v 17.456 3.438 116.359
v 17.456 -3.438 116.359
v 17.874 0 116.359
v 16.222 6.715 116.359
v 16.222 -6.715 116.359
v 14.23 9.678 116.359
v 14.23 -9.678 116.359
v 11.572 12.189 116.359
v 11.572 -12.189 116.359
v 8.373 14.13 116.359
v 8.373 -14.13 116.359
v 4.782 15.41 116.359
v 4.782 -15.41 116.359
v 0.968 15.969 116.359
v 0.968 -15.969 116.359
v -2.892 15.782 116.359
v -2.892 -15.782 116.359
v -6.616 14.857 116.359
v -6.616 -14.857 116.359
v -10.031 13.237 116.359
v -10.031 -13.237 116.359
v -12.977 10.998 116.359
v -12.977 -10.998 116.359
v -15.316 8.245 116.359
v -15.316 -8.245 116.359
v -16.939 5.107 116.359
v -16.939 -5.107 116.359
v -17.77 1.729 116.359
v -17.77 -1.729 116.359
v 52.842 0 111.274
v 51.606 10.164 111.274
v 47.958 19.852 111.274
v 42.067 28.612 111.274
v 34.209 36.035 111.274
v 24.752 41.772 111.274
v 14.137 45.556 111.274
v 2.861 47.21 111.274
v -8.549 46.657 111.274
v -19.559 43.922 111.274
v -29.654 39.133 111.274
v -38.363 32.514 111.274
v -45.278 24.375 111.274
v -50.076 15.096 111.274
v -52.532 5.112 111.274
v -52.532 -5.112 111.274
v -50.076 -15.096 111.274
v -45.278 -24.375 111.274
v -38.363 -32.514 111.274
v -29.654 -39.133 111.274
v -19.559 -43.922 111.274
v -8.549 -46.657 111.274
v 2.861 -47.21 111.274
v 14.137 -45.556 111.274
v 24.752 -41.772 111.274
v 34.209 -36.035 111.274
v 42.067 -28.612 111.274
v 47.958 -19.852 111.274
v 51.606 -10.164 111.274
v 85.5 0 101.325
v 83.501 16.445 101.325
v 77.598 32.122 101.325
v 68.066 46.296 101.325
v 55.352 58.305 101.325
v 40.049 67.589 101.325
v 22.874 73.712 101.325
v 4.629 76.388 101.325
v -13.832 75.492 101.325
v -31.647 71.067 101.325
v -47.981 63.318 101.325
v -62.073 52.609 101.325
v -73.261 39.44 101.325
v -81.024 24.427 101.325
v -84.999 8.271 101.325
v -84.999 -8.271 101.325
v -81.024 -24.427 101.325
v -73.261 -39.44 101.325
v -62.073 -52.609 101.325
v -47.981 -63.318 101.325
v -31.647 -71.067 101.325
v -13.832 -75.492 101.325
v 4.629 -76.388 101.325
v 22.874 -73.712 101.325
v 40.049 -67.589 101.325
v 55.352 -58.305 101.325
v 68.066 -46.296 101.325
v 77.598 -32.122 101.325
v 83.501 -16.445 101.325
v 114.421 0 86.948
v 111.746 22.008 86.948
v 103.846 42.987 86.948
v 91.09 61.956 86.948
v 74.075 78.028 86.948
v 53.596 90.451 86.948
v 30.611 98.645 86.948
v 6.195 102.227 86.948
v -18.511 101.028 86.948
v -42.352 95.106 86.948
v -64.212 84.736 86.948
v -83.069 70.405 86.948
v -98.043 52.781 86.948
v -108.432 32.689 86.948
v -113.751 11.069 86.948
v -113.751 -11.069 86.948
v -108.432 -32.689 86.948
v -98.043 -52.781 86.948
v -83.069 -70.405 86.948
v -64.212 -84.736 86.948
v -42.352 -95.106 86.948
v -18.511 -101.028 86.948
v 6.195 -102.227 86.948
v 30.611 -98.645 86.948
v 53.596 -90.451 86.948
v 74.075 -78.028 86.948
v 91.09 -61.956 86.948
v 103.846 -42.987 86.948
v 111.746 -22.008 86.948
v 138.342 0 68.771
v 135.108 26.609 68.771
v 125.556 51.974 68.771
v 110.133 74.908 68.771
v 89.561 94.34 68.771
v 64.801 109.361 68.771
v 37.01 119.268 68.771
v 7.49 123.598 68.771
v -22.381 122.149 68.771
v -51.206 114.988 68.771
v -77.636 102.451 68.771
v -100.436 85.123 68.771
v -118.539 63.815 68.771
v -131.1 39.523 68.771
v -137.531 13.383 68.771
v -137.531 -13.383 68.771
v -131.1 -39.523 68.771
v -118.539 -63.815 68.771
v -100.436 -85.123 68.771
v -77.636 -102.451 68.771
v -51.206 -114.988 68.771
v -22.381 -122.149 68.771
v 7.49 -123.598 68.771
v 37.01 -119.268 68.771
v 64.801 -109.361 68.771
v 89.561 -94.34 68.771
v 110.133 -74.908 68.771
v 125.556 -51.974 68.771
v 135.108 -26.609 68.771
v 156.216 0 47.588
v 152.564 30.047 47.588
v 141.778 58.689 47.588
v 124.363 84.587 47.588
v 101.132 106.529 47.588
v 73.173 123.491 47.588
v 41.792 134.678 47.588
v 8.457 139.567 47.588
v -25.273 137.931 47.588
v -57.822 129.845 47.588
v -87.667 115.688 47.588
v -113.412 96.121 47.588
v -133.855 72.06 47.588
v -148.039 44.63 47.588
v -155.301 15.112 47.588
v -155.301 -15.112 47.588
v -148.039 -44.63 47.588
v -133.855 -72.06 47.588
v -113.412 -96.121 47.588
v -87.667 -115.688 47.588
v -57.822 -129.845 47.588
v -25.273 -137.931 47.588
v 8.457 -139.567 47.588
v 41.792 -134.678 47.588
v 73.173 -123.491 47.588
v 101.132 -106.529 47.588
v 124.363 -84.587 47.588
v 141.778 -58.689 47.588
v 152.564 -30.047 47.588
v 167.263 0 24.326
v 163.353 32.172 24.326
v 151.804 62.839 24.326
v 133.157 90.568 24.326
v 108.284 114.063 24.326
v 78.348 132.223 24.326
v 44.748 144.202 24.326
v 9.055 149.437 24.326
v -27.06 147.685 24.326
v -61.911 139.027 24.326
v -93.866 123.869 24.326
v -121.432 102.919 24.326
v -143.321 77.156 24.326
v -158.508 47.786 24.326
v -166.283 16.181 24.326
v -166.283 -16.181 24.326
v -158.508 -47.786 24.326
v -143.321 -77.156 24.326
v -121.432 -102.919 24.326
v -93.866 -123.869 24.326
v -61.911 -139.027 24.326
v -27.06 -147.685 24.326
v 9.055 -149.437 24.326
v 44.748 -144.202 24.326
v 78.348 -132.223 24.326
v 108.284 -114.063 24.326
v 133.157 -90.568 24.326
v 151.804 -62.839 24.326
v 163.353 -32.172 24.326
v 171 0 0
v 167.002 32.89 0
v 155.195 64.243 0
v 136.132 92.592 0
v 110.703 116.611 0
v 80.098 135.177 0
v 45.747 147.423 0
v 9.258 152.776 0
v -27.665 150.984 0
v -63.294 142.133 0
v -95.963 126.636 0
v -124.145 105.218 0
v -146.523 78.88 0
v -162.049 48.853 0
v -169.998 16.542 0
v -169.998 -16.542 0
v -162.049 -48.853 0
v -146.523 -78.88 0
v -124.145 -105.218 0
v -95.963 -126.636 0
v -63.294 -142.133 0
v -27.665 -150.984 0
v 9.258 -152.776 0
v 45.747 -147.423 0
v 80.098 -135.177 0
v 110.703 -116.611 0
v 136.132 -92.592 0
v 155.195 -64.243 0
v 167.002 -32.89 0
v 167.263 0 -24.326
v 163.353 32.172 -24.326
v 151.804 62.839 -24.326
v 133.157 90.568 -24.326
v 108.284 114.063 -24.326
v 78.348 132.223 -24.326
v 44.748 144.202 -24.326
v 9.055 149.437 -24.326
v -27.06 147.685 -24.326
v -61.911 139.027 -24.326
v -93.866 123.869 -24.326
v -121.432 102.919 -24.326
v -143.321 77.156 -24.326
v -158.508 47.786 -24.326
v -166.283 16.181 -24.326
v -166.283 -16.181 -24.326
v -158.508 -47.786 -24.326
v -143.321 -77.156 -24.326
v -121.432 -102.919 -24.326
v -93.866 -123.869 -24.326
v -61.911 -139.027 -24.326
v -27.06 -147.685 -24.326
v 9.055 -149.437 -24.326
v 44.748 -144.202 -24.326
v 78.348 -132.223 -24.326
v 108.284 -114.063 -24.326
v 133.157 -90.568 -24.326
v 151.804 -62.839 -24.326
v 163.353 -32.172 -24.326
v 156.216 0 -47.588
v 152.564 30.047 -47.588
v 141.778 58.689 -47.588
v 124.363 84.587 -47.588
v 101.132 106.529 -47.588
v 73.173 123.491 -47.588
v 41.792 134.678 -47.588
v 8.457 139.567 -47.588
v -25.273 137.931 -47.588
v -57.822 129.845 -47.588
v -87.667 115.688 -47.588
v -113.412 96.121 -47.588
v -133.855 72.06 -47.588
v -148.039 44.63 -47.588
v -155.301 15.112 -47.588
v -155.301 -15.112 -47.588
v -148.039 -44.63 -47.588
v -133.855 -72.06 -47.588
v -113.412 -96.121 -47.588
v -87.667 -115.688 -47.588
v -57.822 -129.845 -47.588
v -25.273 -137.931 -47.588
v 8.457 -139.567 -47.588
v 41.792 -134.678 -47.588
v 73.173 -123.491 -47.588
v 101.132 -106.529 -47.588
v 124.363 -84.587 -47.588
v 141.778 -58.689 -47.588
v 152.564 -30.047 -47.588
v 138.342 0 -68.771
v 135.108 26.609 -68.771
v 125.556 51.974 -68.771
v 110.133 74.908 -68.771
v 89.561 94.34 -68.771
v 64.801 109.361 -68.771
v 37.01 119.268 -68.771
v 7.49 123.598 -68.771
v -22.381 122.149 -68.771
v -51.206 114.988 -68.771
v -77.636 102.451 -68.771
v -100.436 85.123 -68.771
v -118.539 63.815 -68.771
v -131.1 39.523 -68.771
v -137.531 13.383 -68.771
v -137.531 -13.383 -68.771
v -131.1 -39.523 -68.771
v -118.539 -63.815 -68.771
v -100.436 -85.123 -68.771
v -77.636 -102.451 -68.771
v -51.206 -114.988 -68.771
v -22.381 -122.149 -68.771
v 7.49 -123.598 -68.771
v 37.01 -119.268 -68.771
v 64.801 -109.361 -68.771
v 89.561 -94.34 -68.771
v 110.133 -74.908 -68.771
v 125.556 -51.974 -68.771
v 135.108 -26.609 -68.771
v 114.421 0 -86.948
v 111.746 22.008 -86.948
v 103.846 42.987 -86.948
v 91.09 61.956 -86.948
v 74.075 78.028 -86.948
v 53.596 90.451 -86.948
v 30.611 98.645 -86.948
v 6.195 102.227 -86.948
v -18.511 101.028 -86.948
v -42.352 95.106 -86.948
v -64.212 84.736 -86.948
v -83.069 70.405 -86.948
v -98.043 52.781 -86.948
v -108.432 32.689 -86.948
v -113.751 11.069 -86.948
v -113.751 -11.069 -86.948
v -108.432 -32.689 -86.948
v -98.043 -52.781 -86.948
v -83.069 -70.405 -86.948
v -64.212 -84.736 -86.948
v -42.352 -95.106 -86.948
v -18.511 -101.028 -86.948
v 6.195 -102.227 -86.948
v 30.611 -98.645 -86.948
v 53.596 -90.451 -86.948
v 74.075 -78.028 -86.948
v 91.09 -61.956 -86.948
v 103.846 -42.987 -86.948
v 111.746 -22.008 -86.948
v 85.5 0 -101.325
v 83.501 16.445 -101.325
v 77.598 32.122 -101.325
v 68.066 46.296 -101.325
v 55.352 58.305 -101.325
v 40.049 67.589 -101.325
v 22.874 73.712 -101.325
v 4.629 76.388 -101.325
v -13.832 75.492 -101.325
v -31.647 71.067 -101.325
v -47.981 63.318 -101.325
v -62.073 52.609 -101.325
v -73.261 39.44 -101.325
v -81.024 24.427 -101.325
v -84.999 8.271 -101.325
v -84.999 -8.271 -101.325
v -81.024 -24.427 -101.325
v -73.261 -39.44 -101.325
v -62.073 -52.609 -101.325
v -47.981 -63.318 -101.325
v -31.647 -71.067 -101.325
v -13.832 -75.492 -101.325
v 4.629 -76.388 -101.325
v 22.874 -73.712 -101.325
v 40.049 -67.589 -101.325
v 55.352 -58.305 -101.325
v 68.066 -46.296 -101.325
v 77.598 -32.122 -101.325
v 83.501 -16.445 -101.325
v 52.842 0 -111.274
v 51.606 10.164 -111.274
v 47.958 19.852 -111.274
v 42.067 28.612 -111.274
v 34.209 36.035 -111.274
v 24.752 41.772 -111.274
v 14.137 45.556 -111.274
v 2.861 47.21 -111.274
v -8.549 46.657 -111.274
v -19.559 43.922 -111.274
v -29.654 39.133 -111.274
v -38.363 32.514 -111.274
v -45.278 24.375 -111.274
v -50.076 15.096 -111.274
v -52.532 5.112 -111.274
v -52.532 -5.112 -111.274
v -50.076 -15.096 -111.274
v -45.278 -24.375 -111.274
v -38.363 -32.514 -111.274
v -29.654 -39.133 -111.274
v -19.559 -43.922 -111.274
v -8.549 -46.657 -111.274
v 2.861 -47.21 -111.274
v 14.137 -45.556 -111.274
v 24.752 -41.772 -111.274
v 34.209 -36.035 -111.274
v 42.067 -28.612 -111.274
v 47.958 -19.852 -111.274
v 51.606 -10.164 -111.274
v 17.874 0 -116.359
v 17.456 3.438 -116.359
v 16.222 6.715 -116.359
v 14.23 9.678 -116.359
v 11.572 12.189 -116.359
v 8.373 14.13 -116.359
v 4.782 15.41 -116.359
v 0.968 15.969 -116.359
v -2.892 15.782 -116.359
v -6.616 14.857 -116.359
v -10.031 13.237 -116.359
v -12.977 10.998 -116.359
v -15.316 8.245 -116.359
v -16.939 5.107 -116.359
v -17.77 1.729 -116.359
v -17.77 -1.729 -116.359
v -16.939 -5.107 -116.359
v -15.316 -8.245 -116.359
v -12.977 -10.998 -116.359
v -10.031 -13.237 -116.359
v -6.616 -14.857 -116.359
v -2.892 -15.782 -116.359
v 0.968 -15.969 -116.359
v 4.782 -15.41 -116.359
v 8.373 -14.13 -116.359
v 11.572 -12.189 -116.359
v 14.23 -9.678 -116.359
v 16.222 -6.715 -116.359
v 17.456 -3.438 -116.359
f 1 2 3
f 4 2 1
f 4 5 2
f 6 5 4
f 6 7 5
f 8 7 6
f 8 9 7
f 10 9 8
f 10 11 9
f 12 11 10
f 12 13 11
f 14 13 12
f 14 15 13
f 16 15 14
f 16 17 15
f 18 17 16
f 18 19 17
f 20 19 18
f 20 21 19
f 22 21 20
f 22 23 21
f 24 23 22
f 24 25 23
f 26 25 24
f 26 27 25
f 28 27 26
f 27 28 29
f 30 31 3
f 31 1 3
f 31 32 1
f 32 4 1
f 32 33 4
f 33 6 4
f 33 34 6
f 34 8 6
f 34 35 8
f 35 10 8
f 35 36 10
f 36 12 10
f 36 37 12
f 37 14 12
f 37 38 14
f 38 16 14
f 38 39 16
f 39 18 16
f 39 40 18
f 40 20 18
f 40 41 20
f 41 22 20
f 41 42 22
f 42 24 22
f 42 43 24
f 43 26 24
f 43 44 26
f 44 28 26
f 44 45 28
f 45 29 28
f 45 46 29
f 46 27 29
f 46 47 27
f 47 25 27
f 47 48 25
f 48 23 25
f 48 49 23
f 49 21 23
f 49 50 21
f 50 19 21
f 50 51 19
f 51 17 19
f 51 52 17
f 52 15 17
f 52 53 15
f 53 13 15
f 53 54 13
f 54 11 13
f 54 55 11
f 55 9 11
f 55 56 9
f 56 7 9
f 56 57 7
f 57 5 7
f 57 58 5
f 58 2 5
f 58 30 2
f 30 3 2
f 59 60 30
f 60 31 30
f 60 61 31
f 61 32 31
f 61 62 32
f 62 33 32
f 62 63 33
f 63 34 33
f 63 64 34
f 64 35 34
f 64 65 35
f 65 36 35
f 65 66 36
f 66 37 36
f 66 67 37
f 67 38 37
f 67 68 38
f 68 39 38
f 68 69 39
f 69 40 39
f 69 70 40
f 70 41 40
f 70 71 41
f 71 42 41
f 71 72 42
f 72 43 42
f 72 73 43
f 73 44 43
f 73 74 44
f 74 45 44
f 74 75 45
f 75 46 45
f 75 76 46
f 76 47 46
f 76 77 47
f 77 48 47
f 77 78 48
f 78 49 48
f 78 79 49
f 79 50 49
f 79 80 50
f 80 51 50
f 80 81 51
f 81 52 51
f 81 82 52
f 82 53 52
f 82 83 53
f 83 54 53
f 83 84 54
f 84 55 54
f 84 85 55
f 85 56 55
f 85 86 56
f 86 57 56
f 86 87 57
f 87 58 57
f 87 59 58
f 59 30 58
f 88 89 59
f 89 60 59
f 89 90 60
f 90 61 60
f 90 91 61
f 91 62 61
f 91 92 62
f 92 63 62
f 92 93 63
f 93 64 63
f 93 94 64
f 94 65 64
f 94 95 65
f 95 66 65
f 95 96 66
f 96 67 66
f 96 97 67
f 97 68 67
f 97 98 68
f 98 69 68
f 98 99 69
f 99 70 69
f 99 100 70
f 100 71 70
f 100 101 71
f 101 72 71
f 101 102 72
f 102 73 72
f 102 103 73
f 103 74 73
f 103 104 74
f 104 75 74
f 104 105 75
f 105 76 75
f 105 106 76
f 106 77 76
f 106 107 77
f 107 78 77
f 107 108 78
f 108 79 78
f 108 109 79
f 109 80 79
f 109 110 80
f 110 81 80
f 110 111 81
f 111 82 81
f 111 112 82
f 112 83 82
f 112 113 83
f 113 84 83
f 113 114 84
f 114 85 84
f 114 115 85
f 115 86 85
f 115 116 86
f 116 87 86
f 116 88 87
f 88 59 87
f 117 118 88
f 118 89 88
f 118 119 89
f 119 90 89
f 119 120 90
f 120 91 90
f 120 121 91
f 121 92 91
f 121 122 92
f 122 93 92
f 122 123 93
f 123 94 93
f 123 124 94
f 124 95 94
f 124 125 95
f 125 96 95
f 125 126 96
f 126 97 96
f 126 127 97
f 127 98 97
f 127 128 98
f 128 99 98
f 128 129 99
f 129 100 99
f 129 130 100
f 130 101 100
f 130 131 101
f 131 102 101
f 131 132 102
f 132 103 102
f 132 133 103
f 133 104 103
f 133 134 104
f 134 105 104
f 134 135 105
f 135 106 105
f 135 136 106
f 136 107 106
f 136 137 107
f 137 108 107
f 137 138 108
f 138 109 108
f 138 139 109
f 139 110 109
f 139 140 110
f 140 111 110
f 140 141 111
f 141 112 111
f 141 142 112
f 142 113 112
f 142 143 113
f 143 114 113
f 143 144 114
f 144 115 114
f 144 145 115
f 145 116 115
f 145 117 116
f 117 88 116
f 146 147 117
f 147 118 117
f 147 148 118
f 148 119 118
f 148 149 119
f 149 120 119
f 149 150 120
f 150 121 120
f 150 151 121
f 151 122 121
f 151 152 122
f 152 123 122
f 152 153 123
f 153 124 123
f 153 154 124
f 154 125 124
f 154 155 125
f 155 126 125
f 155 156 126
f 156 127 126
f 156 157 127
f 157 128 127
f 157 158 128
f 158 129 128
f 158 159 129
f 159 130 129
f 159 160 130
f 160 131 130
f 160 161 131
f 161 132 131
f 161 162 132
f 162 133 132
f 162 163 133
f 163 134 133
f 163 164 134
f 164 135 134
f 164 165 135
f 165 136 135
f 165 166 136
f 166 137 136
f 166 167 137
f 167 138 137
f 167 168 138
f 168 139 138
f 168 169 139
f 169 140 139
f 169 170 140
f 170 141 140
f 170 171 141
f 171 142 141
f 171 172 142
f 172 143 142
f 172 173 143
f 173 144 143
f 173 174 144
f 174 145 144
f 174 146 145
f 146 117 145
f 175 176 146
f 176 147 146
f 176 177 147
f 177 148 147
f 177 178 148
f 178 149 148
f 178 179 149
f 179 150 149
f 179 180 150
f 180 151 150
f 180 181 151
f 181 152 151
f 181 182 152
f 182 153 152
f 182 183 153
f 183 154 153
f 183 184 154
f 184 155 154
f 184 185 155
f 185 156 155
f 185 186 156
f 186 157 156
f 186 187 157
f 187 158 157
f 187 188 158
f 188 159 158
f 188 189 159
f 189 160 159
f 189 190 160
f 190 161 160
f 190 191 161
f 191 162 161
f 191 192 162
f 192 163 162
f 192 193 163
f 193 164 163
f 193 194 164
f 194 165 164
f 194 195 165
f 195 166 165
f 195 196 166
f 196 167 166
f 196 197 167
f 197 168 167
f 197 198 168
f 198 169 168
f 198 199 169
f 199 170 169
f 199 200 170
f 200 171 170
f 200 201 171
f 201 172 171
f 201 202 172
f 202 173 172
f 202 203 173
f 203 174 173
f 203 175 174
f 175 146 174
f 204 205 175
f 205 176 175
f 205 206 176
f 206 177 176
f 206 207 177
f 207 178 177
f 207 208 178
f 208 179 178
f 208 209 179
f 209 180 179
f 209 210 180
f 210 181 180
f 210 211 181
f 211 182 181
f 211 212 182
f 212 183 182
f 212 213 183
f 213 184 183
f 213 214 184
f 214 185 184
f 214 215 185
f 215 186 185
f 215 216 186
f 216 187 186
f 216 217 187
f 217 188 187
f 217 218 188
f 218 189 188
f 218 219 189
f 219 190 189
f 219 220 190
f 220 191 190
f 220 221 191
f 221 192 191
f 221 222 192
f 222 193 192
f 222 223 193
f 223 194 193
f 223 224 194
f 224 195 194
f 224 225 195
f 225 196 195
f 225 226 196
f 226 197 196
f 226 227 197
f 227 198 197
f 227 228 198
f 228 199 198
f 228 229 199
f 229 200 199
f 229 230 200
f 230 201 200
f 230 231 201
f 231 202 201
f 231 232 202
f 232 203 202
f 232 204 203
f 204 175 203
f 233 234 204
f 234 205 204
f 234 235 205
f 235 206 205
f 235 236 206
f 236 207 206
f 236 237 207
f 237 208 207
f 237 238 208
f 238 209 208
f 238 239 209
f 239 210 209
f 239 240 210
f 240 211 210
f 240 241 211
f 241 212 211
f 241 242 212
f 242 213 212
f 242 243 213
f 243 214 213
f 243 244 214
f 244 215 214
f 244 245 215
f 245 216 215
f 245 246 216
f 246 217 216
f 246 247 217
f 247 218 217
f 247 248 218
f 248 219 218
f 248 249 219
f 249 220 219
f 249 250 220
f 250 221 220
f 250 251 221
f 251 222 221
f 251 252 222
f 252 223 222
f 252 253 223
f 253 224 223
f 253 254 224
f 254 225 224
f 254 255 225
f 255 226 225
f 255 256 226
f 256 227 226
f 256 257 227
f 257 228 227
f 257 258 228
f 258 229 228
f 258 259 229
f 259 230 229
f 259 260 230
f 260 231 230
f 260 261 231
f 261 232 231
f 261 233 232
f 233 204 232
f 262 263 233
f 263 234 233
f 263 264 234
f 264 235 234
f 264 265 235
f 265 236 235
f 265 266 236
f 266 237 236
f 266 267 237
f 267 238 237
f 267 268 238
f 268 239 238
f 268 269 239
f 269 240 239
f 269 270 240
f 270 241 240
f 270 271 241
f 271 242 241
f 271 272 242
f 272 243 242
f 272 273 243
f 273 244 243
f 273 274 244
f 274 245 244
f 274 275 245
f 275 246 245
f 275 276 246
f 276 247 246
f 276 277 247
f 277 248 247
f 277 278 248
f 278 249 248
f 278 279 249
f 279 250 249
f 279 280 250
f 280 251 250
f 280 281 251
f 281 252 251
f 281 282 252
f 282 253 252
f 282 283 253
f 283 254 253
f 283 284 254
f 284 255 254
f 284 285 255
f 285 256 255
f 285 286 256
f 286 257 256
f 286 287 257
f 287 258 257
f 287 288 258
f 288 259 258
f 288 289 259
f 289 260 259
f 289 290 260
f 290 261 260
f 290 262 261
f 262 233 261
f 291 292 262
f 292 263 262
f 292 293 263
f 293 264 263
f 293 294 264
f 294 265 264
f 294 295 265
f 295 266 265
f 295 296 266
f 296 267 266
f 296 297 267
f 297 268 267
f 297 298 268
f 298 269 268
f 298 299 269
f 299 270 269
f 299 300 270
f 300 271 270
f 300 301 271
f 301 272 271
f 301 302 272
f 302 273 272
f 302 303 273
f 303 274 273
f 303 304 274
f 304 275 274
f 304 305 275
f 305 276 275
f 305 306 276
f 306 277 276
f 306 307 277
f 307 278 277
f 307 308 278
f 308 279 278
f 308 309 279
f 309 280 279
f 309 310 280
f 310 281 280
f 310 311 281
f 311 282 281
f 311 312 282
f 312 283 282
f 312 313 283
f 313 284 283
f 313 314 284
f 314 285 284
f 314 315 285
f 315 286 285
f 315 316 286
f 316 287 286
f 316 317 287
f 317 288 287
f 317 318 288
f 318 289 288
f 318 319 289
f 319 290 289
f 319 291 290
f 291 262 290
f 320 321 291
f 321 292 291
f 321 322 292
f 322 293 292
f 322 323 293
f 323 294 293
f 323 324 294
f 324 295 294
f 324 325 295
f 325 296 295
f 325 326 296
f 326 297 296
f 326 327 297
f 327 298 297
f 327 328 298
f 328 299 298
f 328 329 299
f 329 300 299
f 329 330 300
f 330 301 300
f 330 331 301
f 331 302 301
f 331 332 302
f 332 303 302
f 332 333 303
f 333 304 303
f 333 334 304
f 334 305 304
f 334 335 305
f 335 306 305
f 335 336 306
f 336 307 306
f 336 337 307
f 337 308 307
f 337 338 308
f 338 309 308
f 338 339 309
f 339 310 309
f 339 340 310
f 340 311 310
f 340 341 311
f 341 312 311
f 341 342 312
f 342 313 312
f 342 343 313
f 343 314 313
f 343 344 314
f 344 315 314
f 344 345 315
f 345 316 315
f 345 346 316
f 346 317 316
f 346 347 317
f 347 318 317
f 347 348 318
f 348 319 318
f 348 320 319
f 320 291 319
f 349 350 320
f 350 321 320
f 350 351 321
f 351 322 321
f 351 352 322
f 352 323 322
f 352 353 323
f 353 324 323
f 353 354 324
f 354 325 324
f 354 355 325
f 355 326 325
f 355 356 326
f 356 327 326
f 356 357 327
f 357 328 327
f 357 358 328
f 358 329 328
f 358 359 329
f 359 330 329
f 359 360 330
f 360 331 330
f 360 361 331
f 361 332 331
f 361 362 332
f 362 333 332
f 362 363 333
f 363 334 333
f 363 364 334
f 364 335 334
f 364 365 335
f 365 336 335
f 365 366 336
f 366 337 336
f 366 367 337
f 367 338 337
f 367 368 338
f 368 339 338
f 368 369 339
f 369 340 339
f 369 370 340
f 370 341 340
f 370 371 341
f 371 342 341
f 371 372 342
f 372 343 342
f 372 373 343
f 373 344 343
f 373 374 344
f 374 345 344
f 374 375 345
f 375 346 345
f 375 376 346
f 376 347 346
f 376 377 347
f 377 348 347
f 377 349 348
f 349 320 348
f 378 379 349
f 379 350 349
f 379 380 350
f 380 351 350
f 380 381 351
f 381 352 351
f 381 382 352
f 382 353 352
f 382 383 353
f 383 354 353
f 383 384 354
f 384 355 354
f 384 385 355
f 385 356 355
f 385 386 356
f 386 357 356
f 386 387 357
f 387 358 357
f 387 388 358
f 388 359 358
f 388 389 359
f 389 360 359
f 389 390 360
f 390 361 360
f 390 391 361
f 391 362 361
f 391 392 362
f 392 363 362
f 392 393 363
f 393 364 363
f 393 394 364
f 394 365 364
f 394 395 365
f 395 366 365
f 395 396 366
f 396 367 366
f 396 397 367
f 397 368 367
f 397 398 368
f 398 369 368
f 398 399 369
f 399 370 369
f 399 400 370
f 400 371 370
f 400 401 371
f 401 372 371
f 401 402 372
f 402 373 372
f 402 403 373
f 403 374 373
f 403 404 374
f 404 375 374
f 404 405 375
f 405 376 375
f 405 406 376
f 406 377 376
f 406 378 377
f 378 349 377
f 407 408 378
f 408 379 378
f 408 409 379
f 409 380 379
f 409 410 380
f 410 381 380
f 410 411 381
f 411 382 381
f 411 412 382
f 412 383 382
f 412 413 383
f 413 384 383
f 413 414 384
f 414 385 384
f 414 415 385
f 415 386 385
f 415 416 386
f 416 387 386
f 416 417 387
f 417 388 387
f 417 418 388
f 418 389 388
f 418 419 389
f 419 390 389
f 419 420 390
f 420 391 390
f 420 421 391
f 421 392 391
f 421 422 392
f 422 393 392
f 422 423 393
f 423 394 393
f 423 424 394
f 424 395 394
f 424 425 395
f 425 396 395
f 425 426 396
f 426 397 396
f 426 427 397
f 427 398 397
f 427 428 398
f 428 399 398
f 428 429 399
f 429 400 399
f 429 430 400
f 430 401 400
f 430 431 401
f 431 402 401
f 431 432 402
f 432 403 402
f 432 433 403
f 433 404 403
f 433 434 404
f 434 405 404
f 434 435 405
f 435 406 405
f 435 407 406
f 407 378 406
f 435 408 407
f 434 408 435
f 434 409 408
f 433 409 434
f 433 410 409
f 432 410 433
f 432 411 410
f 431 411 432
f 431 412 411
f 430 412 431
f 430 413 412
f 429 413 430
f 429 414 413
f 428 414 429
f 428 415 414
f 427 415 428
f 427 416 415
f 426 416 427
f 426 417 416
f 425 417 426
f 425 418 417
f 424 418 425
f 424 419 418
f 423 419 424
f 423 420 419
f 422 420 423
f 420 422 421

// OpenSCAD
// Generated by SolidPython 1.0.1 on 2020-07-29 00:46:54


scale(v = [19, 17, 13]) {
	sphere(r = 9);
}
/***********************************************
*********      SolidPython code:      **********
************************************************
 
# import packages: SolidPython
from solid import *
from solid.utils import *
from itertools import chain, combinations, permutations


class Resize:

    def __init__(self, scad_file):
        self.scad_file = scad_file
        #self.scad_file = import_scad(scad_file)
        # cone/cylinder param:
        self.r1 = 0
        self.r2 = 0
        self.h = 0
        # rectangular prism param:
        self.w = 0
        self.l = 0
        # ellipse param:
        self.r = 0

    # import OpenScad code (file name corresponds to shape)


    # classify shape + parameters
    def assign(self, param1, param2, param3):
        if self.scad_file == 'cone.scad':
            self.r1 = param1
            self.r2 = param2
            self.h = param3
        elif self.scad_file == 'cylinder.scad':
            self.r1 = param1
            self.r2 = param2
            self.h = param3
        elif self.scad_file == 'rectangularPrism.scad':
            self.h = param1
            self.l = param2
            self.w = param3
        else:
            self.r = param1
            self.h = param2

    # resize parameters
    def iterate(self):
        x = range(3, 20, 2)
        i = 1
        if self.scad_file == 'cone.scad':
            tempList = list(permutations(x, 2))
            for temp in tempList:
                param1 = temp[0]
                param2 = temp[1]
                filepath = 'produced_scad_files/' + 'cone' + str(param1) + '_' + str(param2) + '_' + '.scad'
                scad_render_to_file(cylinder(h=param1, r1=param2, r2=0), filepath)

        elif self.scad_file == 'cylinder.scad':
            tempList = list(permutations(x, 3))
            for temp in tempList:
                param1 = temp[0]
                param2 = temp[1]
                filepath = 'produced_scad_files/' + 'cylinder' + str(param1) + '_' + str(param2) + '_' + '.scad'
                scad_render_to_file(cylinder(h=param1, r1=param2, r2=param2), filepath)

        elif self.scad_file == 'rectangularPrism.scad':
            tempList = list(permutations(x, 3))
            for temp in tempList:
                param1 = temp[0]
                param2 = temp[1]
                param3 = temp[2]
                filepath = 'produced_scad_files/' + 'rectangularPrism' + str(param1) + '_' + str(param2) + '_' + str(
                    param3) + '.scad'
                scad_render_to_file(cube(size=(param1, param2, param3)), filepath)

        elif self.scad_file == 'ellipse.scad':
            tempList = list(permutations(x, 4))
            for temp in tempList:
                param1 = temp[0]
                param2 = temp[1]
                param3 = temp[2]
                param4 = temp[3]
                filepath = 'produced_scad_files/' + 'ellipse' + str(param1) + '_' + str(param2) + '_' + str(param3) + '_' + str(param4) + '.scad'
                scad_render_to_file(scale([param1, param2, param3])(sphere(r=param4)), filepath)

    def render_to_scadfile(self):
        scad_render_to_file(scad, 'example.scad') 
 
************************************************/
